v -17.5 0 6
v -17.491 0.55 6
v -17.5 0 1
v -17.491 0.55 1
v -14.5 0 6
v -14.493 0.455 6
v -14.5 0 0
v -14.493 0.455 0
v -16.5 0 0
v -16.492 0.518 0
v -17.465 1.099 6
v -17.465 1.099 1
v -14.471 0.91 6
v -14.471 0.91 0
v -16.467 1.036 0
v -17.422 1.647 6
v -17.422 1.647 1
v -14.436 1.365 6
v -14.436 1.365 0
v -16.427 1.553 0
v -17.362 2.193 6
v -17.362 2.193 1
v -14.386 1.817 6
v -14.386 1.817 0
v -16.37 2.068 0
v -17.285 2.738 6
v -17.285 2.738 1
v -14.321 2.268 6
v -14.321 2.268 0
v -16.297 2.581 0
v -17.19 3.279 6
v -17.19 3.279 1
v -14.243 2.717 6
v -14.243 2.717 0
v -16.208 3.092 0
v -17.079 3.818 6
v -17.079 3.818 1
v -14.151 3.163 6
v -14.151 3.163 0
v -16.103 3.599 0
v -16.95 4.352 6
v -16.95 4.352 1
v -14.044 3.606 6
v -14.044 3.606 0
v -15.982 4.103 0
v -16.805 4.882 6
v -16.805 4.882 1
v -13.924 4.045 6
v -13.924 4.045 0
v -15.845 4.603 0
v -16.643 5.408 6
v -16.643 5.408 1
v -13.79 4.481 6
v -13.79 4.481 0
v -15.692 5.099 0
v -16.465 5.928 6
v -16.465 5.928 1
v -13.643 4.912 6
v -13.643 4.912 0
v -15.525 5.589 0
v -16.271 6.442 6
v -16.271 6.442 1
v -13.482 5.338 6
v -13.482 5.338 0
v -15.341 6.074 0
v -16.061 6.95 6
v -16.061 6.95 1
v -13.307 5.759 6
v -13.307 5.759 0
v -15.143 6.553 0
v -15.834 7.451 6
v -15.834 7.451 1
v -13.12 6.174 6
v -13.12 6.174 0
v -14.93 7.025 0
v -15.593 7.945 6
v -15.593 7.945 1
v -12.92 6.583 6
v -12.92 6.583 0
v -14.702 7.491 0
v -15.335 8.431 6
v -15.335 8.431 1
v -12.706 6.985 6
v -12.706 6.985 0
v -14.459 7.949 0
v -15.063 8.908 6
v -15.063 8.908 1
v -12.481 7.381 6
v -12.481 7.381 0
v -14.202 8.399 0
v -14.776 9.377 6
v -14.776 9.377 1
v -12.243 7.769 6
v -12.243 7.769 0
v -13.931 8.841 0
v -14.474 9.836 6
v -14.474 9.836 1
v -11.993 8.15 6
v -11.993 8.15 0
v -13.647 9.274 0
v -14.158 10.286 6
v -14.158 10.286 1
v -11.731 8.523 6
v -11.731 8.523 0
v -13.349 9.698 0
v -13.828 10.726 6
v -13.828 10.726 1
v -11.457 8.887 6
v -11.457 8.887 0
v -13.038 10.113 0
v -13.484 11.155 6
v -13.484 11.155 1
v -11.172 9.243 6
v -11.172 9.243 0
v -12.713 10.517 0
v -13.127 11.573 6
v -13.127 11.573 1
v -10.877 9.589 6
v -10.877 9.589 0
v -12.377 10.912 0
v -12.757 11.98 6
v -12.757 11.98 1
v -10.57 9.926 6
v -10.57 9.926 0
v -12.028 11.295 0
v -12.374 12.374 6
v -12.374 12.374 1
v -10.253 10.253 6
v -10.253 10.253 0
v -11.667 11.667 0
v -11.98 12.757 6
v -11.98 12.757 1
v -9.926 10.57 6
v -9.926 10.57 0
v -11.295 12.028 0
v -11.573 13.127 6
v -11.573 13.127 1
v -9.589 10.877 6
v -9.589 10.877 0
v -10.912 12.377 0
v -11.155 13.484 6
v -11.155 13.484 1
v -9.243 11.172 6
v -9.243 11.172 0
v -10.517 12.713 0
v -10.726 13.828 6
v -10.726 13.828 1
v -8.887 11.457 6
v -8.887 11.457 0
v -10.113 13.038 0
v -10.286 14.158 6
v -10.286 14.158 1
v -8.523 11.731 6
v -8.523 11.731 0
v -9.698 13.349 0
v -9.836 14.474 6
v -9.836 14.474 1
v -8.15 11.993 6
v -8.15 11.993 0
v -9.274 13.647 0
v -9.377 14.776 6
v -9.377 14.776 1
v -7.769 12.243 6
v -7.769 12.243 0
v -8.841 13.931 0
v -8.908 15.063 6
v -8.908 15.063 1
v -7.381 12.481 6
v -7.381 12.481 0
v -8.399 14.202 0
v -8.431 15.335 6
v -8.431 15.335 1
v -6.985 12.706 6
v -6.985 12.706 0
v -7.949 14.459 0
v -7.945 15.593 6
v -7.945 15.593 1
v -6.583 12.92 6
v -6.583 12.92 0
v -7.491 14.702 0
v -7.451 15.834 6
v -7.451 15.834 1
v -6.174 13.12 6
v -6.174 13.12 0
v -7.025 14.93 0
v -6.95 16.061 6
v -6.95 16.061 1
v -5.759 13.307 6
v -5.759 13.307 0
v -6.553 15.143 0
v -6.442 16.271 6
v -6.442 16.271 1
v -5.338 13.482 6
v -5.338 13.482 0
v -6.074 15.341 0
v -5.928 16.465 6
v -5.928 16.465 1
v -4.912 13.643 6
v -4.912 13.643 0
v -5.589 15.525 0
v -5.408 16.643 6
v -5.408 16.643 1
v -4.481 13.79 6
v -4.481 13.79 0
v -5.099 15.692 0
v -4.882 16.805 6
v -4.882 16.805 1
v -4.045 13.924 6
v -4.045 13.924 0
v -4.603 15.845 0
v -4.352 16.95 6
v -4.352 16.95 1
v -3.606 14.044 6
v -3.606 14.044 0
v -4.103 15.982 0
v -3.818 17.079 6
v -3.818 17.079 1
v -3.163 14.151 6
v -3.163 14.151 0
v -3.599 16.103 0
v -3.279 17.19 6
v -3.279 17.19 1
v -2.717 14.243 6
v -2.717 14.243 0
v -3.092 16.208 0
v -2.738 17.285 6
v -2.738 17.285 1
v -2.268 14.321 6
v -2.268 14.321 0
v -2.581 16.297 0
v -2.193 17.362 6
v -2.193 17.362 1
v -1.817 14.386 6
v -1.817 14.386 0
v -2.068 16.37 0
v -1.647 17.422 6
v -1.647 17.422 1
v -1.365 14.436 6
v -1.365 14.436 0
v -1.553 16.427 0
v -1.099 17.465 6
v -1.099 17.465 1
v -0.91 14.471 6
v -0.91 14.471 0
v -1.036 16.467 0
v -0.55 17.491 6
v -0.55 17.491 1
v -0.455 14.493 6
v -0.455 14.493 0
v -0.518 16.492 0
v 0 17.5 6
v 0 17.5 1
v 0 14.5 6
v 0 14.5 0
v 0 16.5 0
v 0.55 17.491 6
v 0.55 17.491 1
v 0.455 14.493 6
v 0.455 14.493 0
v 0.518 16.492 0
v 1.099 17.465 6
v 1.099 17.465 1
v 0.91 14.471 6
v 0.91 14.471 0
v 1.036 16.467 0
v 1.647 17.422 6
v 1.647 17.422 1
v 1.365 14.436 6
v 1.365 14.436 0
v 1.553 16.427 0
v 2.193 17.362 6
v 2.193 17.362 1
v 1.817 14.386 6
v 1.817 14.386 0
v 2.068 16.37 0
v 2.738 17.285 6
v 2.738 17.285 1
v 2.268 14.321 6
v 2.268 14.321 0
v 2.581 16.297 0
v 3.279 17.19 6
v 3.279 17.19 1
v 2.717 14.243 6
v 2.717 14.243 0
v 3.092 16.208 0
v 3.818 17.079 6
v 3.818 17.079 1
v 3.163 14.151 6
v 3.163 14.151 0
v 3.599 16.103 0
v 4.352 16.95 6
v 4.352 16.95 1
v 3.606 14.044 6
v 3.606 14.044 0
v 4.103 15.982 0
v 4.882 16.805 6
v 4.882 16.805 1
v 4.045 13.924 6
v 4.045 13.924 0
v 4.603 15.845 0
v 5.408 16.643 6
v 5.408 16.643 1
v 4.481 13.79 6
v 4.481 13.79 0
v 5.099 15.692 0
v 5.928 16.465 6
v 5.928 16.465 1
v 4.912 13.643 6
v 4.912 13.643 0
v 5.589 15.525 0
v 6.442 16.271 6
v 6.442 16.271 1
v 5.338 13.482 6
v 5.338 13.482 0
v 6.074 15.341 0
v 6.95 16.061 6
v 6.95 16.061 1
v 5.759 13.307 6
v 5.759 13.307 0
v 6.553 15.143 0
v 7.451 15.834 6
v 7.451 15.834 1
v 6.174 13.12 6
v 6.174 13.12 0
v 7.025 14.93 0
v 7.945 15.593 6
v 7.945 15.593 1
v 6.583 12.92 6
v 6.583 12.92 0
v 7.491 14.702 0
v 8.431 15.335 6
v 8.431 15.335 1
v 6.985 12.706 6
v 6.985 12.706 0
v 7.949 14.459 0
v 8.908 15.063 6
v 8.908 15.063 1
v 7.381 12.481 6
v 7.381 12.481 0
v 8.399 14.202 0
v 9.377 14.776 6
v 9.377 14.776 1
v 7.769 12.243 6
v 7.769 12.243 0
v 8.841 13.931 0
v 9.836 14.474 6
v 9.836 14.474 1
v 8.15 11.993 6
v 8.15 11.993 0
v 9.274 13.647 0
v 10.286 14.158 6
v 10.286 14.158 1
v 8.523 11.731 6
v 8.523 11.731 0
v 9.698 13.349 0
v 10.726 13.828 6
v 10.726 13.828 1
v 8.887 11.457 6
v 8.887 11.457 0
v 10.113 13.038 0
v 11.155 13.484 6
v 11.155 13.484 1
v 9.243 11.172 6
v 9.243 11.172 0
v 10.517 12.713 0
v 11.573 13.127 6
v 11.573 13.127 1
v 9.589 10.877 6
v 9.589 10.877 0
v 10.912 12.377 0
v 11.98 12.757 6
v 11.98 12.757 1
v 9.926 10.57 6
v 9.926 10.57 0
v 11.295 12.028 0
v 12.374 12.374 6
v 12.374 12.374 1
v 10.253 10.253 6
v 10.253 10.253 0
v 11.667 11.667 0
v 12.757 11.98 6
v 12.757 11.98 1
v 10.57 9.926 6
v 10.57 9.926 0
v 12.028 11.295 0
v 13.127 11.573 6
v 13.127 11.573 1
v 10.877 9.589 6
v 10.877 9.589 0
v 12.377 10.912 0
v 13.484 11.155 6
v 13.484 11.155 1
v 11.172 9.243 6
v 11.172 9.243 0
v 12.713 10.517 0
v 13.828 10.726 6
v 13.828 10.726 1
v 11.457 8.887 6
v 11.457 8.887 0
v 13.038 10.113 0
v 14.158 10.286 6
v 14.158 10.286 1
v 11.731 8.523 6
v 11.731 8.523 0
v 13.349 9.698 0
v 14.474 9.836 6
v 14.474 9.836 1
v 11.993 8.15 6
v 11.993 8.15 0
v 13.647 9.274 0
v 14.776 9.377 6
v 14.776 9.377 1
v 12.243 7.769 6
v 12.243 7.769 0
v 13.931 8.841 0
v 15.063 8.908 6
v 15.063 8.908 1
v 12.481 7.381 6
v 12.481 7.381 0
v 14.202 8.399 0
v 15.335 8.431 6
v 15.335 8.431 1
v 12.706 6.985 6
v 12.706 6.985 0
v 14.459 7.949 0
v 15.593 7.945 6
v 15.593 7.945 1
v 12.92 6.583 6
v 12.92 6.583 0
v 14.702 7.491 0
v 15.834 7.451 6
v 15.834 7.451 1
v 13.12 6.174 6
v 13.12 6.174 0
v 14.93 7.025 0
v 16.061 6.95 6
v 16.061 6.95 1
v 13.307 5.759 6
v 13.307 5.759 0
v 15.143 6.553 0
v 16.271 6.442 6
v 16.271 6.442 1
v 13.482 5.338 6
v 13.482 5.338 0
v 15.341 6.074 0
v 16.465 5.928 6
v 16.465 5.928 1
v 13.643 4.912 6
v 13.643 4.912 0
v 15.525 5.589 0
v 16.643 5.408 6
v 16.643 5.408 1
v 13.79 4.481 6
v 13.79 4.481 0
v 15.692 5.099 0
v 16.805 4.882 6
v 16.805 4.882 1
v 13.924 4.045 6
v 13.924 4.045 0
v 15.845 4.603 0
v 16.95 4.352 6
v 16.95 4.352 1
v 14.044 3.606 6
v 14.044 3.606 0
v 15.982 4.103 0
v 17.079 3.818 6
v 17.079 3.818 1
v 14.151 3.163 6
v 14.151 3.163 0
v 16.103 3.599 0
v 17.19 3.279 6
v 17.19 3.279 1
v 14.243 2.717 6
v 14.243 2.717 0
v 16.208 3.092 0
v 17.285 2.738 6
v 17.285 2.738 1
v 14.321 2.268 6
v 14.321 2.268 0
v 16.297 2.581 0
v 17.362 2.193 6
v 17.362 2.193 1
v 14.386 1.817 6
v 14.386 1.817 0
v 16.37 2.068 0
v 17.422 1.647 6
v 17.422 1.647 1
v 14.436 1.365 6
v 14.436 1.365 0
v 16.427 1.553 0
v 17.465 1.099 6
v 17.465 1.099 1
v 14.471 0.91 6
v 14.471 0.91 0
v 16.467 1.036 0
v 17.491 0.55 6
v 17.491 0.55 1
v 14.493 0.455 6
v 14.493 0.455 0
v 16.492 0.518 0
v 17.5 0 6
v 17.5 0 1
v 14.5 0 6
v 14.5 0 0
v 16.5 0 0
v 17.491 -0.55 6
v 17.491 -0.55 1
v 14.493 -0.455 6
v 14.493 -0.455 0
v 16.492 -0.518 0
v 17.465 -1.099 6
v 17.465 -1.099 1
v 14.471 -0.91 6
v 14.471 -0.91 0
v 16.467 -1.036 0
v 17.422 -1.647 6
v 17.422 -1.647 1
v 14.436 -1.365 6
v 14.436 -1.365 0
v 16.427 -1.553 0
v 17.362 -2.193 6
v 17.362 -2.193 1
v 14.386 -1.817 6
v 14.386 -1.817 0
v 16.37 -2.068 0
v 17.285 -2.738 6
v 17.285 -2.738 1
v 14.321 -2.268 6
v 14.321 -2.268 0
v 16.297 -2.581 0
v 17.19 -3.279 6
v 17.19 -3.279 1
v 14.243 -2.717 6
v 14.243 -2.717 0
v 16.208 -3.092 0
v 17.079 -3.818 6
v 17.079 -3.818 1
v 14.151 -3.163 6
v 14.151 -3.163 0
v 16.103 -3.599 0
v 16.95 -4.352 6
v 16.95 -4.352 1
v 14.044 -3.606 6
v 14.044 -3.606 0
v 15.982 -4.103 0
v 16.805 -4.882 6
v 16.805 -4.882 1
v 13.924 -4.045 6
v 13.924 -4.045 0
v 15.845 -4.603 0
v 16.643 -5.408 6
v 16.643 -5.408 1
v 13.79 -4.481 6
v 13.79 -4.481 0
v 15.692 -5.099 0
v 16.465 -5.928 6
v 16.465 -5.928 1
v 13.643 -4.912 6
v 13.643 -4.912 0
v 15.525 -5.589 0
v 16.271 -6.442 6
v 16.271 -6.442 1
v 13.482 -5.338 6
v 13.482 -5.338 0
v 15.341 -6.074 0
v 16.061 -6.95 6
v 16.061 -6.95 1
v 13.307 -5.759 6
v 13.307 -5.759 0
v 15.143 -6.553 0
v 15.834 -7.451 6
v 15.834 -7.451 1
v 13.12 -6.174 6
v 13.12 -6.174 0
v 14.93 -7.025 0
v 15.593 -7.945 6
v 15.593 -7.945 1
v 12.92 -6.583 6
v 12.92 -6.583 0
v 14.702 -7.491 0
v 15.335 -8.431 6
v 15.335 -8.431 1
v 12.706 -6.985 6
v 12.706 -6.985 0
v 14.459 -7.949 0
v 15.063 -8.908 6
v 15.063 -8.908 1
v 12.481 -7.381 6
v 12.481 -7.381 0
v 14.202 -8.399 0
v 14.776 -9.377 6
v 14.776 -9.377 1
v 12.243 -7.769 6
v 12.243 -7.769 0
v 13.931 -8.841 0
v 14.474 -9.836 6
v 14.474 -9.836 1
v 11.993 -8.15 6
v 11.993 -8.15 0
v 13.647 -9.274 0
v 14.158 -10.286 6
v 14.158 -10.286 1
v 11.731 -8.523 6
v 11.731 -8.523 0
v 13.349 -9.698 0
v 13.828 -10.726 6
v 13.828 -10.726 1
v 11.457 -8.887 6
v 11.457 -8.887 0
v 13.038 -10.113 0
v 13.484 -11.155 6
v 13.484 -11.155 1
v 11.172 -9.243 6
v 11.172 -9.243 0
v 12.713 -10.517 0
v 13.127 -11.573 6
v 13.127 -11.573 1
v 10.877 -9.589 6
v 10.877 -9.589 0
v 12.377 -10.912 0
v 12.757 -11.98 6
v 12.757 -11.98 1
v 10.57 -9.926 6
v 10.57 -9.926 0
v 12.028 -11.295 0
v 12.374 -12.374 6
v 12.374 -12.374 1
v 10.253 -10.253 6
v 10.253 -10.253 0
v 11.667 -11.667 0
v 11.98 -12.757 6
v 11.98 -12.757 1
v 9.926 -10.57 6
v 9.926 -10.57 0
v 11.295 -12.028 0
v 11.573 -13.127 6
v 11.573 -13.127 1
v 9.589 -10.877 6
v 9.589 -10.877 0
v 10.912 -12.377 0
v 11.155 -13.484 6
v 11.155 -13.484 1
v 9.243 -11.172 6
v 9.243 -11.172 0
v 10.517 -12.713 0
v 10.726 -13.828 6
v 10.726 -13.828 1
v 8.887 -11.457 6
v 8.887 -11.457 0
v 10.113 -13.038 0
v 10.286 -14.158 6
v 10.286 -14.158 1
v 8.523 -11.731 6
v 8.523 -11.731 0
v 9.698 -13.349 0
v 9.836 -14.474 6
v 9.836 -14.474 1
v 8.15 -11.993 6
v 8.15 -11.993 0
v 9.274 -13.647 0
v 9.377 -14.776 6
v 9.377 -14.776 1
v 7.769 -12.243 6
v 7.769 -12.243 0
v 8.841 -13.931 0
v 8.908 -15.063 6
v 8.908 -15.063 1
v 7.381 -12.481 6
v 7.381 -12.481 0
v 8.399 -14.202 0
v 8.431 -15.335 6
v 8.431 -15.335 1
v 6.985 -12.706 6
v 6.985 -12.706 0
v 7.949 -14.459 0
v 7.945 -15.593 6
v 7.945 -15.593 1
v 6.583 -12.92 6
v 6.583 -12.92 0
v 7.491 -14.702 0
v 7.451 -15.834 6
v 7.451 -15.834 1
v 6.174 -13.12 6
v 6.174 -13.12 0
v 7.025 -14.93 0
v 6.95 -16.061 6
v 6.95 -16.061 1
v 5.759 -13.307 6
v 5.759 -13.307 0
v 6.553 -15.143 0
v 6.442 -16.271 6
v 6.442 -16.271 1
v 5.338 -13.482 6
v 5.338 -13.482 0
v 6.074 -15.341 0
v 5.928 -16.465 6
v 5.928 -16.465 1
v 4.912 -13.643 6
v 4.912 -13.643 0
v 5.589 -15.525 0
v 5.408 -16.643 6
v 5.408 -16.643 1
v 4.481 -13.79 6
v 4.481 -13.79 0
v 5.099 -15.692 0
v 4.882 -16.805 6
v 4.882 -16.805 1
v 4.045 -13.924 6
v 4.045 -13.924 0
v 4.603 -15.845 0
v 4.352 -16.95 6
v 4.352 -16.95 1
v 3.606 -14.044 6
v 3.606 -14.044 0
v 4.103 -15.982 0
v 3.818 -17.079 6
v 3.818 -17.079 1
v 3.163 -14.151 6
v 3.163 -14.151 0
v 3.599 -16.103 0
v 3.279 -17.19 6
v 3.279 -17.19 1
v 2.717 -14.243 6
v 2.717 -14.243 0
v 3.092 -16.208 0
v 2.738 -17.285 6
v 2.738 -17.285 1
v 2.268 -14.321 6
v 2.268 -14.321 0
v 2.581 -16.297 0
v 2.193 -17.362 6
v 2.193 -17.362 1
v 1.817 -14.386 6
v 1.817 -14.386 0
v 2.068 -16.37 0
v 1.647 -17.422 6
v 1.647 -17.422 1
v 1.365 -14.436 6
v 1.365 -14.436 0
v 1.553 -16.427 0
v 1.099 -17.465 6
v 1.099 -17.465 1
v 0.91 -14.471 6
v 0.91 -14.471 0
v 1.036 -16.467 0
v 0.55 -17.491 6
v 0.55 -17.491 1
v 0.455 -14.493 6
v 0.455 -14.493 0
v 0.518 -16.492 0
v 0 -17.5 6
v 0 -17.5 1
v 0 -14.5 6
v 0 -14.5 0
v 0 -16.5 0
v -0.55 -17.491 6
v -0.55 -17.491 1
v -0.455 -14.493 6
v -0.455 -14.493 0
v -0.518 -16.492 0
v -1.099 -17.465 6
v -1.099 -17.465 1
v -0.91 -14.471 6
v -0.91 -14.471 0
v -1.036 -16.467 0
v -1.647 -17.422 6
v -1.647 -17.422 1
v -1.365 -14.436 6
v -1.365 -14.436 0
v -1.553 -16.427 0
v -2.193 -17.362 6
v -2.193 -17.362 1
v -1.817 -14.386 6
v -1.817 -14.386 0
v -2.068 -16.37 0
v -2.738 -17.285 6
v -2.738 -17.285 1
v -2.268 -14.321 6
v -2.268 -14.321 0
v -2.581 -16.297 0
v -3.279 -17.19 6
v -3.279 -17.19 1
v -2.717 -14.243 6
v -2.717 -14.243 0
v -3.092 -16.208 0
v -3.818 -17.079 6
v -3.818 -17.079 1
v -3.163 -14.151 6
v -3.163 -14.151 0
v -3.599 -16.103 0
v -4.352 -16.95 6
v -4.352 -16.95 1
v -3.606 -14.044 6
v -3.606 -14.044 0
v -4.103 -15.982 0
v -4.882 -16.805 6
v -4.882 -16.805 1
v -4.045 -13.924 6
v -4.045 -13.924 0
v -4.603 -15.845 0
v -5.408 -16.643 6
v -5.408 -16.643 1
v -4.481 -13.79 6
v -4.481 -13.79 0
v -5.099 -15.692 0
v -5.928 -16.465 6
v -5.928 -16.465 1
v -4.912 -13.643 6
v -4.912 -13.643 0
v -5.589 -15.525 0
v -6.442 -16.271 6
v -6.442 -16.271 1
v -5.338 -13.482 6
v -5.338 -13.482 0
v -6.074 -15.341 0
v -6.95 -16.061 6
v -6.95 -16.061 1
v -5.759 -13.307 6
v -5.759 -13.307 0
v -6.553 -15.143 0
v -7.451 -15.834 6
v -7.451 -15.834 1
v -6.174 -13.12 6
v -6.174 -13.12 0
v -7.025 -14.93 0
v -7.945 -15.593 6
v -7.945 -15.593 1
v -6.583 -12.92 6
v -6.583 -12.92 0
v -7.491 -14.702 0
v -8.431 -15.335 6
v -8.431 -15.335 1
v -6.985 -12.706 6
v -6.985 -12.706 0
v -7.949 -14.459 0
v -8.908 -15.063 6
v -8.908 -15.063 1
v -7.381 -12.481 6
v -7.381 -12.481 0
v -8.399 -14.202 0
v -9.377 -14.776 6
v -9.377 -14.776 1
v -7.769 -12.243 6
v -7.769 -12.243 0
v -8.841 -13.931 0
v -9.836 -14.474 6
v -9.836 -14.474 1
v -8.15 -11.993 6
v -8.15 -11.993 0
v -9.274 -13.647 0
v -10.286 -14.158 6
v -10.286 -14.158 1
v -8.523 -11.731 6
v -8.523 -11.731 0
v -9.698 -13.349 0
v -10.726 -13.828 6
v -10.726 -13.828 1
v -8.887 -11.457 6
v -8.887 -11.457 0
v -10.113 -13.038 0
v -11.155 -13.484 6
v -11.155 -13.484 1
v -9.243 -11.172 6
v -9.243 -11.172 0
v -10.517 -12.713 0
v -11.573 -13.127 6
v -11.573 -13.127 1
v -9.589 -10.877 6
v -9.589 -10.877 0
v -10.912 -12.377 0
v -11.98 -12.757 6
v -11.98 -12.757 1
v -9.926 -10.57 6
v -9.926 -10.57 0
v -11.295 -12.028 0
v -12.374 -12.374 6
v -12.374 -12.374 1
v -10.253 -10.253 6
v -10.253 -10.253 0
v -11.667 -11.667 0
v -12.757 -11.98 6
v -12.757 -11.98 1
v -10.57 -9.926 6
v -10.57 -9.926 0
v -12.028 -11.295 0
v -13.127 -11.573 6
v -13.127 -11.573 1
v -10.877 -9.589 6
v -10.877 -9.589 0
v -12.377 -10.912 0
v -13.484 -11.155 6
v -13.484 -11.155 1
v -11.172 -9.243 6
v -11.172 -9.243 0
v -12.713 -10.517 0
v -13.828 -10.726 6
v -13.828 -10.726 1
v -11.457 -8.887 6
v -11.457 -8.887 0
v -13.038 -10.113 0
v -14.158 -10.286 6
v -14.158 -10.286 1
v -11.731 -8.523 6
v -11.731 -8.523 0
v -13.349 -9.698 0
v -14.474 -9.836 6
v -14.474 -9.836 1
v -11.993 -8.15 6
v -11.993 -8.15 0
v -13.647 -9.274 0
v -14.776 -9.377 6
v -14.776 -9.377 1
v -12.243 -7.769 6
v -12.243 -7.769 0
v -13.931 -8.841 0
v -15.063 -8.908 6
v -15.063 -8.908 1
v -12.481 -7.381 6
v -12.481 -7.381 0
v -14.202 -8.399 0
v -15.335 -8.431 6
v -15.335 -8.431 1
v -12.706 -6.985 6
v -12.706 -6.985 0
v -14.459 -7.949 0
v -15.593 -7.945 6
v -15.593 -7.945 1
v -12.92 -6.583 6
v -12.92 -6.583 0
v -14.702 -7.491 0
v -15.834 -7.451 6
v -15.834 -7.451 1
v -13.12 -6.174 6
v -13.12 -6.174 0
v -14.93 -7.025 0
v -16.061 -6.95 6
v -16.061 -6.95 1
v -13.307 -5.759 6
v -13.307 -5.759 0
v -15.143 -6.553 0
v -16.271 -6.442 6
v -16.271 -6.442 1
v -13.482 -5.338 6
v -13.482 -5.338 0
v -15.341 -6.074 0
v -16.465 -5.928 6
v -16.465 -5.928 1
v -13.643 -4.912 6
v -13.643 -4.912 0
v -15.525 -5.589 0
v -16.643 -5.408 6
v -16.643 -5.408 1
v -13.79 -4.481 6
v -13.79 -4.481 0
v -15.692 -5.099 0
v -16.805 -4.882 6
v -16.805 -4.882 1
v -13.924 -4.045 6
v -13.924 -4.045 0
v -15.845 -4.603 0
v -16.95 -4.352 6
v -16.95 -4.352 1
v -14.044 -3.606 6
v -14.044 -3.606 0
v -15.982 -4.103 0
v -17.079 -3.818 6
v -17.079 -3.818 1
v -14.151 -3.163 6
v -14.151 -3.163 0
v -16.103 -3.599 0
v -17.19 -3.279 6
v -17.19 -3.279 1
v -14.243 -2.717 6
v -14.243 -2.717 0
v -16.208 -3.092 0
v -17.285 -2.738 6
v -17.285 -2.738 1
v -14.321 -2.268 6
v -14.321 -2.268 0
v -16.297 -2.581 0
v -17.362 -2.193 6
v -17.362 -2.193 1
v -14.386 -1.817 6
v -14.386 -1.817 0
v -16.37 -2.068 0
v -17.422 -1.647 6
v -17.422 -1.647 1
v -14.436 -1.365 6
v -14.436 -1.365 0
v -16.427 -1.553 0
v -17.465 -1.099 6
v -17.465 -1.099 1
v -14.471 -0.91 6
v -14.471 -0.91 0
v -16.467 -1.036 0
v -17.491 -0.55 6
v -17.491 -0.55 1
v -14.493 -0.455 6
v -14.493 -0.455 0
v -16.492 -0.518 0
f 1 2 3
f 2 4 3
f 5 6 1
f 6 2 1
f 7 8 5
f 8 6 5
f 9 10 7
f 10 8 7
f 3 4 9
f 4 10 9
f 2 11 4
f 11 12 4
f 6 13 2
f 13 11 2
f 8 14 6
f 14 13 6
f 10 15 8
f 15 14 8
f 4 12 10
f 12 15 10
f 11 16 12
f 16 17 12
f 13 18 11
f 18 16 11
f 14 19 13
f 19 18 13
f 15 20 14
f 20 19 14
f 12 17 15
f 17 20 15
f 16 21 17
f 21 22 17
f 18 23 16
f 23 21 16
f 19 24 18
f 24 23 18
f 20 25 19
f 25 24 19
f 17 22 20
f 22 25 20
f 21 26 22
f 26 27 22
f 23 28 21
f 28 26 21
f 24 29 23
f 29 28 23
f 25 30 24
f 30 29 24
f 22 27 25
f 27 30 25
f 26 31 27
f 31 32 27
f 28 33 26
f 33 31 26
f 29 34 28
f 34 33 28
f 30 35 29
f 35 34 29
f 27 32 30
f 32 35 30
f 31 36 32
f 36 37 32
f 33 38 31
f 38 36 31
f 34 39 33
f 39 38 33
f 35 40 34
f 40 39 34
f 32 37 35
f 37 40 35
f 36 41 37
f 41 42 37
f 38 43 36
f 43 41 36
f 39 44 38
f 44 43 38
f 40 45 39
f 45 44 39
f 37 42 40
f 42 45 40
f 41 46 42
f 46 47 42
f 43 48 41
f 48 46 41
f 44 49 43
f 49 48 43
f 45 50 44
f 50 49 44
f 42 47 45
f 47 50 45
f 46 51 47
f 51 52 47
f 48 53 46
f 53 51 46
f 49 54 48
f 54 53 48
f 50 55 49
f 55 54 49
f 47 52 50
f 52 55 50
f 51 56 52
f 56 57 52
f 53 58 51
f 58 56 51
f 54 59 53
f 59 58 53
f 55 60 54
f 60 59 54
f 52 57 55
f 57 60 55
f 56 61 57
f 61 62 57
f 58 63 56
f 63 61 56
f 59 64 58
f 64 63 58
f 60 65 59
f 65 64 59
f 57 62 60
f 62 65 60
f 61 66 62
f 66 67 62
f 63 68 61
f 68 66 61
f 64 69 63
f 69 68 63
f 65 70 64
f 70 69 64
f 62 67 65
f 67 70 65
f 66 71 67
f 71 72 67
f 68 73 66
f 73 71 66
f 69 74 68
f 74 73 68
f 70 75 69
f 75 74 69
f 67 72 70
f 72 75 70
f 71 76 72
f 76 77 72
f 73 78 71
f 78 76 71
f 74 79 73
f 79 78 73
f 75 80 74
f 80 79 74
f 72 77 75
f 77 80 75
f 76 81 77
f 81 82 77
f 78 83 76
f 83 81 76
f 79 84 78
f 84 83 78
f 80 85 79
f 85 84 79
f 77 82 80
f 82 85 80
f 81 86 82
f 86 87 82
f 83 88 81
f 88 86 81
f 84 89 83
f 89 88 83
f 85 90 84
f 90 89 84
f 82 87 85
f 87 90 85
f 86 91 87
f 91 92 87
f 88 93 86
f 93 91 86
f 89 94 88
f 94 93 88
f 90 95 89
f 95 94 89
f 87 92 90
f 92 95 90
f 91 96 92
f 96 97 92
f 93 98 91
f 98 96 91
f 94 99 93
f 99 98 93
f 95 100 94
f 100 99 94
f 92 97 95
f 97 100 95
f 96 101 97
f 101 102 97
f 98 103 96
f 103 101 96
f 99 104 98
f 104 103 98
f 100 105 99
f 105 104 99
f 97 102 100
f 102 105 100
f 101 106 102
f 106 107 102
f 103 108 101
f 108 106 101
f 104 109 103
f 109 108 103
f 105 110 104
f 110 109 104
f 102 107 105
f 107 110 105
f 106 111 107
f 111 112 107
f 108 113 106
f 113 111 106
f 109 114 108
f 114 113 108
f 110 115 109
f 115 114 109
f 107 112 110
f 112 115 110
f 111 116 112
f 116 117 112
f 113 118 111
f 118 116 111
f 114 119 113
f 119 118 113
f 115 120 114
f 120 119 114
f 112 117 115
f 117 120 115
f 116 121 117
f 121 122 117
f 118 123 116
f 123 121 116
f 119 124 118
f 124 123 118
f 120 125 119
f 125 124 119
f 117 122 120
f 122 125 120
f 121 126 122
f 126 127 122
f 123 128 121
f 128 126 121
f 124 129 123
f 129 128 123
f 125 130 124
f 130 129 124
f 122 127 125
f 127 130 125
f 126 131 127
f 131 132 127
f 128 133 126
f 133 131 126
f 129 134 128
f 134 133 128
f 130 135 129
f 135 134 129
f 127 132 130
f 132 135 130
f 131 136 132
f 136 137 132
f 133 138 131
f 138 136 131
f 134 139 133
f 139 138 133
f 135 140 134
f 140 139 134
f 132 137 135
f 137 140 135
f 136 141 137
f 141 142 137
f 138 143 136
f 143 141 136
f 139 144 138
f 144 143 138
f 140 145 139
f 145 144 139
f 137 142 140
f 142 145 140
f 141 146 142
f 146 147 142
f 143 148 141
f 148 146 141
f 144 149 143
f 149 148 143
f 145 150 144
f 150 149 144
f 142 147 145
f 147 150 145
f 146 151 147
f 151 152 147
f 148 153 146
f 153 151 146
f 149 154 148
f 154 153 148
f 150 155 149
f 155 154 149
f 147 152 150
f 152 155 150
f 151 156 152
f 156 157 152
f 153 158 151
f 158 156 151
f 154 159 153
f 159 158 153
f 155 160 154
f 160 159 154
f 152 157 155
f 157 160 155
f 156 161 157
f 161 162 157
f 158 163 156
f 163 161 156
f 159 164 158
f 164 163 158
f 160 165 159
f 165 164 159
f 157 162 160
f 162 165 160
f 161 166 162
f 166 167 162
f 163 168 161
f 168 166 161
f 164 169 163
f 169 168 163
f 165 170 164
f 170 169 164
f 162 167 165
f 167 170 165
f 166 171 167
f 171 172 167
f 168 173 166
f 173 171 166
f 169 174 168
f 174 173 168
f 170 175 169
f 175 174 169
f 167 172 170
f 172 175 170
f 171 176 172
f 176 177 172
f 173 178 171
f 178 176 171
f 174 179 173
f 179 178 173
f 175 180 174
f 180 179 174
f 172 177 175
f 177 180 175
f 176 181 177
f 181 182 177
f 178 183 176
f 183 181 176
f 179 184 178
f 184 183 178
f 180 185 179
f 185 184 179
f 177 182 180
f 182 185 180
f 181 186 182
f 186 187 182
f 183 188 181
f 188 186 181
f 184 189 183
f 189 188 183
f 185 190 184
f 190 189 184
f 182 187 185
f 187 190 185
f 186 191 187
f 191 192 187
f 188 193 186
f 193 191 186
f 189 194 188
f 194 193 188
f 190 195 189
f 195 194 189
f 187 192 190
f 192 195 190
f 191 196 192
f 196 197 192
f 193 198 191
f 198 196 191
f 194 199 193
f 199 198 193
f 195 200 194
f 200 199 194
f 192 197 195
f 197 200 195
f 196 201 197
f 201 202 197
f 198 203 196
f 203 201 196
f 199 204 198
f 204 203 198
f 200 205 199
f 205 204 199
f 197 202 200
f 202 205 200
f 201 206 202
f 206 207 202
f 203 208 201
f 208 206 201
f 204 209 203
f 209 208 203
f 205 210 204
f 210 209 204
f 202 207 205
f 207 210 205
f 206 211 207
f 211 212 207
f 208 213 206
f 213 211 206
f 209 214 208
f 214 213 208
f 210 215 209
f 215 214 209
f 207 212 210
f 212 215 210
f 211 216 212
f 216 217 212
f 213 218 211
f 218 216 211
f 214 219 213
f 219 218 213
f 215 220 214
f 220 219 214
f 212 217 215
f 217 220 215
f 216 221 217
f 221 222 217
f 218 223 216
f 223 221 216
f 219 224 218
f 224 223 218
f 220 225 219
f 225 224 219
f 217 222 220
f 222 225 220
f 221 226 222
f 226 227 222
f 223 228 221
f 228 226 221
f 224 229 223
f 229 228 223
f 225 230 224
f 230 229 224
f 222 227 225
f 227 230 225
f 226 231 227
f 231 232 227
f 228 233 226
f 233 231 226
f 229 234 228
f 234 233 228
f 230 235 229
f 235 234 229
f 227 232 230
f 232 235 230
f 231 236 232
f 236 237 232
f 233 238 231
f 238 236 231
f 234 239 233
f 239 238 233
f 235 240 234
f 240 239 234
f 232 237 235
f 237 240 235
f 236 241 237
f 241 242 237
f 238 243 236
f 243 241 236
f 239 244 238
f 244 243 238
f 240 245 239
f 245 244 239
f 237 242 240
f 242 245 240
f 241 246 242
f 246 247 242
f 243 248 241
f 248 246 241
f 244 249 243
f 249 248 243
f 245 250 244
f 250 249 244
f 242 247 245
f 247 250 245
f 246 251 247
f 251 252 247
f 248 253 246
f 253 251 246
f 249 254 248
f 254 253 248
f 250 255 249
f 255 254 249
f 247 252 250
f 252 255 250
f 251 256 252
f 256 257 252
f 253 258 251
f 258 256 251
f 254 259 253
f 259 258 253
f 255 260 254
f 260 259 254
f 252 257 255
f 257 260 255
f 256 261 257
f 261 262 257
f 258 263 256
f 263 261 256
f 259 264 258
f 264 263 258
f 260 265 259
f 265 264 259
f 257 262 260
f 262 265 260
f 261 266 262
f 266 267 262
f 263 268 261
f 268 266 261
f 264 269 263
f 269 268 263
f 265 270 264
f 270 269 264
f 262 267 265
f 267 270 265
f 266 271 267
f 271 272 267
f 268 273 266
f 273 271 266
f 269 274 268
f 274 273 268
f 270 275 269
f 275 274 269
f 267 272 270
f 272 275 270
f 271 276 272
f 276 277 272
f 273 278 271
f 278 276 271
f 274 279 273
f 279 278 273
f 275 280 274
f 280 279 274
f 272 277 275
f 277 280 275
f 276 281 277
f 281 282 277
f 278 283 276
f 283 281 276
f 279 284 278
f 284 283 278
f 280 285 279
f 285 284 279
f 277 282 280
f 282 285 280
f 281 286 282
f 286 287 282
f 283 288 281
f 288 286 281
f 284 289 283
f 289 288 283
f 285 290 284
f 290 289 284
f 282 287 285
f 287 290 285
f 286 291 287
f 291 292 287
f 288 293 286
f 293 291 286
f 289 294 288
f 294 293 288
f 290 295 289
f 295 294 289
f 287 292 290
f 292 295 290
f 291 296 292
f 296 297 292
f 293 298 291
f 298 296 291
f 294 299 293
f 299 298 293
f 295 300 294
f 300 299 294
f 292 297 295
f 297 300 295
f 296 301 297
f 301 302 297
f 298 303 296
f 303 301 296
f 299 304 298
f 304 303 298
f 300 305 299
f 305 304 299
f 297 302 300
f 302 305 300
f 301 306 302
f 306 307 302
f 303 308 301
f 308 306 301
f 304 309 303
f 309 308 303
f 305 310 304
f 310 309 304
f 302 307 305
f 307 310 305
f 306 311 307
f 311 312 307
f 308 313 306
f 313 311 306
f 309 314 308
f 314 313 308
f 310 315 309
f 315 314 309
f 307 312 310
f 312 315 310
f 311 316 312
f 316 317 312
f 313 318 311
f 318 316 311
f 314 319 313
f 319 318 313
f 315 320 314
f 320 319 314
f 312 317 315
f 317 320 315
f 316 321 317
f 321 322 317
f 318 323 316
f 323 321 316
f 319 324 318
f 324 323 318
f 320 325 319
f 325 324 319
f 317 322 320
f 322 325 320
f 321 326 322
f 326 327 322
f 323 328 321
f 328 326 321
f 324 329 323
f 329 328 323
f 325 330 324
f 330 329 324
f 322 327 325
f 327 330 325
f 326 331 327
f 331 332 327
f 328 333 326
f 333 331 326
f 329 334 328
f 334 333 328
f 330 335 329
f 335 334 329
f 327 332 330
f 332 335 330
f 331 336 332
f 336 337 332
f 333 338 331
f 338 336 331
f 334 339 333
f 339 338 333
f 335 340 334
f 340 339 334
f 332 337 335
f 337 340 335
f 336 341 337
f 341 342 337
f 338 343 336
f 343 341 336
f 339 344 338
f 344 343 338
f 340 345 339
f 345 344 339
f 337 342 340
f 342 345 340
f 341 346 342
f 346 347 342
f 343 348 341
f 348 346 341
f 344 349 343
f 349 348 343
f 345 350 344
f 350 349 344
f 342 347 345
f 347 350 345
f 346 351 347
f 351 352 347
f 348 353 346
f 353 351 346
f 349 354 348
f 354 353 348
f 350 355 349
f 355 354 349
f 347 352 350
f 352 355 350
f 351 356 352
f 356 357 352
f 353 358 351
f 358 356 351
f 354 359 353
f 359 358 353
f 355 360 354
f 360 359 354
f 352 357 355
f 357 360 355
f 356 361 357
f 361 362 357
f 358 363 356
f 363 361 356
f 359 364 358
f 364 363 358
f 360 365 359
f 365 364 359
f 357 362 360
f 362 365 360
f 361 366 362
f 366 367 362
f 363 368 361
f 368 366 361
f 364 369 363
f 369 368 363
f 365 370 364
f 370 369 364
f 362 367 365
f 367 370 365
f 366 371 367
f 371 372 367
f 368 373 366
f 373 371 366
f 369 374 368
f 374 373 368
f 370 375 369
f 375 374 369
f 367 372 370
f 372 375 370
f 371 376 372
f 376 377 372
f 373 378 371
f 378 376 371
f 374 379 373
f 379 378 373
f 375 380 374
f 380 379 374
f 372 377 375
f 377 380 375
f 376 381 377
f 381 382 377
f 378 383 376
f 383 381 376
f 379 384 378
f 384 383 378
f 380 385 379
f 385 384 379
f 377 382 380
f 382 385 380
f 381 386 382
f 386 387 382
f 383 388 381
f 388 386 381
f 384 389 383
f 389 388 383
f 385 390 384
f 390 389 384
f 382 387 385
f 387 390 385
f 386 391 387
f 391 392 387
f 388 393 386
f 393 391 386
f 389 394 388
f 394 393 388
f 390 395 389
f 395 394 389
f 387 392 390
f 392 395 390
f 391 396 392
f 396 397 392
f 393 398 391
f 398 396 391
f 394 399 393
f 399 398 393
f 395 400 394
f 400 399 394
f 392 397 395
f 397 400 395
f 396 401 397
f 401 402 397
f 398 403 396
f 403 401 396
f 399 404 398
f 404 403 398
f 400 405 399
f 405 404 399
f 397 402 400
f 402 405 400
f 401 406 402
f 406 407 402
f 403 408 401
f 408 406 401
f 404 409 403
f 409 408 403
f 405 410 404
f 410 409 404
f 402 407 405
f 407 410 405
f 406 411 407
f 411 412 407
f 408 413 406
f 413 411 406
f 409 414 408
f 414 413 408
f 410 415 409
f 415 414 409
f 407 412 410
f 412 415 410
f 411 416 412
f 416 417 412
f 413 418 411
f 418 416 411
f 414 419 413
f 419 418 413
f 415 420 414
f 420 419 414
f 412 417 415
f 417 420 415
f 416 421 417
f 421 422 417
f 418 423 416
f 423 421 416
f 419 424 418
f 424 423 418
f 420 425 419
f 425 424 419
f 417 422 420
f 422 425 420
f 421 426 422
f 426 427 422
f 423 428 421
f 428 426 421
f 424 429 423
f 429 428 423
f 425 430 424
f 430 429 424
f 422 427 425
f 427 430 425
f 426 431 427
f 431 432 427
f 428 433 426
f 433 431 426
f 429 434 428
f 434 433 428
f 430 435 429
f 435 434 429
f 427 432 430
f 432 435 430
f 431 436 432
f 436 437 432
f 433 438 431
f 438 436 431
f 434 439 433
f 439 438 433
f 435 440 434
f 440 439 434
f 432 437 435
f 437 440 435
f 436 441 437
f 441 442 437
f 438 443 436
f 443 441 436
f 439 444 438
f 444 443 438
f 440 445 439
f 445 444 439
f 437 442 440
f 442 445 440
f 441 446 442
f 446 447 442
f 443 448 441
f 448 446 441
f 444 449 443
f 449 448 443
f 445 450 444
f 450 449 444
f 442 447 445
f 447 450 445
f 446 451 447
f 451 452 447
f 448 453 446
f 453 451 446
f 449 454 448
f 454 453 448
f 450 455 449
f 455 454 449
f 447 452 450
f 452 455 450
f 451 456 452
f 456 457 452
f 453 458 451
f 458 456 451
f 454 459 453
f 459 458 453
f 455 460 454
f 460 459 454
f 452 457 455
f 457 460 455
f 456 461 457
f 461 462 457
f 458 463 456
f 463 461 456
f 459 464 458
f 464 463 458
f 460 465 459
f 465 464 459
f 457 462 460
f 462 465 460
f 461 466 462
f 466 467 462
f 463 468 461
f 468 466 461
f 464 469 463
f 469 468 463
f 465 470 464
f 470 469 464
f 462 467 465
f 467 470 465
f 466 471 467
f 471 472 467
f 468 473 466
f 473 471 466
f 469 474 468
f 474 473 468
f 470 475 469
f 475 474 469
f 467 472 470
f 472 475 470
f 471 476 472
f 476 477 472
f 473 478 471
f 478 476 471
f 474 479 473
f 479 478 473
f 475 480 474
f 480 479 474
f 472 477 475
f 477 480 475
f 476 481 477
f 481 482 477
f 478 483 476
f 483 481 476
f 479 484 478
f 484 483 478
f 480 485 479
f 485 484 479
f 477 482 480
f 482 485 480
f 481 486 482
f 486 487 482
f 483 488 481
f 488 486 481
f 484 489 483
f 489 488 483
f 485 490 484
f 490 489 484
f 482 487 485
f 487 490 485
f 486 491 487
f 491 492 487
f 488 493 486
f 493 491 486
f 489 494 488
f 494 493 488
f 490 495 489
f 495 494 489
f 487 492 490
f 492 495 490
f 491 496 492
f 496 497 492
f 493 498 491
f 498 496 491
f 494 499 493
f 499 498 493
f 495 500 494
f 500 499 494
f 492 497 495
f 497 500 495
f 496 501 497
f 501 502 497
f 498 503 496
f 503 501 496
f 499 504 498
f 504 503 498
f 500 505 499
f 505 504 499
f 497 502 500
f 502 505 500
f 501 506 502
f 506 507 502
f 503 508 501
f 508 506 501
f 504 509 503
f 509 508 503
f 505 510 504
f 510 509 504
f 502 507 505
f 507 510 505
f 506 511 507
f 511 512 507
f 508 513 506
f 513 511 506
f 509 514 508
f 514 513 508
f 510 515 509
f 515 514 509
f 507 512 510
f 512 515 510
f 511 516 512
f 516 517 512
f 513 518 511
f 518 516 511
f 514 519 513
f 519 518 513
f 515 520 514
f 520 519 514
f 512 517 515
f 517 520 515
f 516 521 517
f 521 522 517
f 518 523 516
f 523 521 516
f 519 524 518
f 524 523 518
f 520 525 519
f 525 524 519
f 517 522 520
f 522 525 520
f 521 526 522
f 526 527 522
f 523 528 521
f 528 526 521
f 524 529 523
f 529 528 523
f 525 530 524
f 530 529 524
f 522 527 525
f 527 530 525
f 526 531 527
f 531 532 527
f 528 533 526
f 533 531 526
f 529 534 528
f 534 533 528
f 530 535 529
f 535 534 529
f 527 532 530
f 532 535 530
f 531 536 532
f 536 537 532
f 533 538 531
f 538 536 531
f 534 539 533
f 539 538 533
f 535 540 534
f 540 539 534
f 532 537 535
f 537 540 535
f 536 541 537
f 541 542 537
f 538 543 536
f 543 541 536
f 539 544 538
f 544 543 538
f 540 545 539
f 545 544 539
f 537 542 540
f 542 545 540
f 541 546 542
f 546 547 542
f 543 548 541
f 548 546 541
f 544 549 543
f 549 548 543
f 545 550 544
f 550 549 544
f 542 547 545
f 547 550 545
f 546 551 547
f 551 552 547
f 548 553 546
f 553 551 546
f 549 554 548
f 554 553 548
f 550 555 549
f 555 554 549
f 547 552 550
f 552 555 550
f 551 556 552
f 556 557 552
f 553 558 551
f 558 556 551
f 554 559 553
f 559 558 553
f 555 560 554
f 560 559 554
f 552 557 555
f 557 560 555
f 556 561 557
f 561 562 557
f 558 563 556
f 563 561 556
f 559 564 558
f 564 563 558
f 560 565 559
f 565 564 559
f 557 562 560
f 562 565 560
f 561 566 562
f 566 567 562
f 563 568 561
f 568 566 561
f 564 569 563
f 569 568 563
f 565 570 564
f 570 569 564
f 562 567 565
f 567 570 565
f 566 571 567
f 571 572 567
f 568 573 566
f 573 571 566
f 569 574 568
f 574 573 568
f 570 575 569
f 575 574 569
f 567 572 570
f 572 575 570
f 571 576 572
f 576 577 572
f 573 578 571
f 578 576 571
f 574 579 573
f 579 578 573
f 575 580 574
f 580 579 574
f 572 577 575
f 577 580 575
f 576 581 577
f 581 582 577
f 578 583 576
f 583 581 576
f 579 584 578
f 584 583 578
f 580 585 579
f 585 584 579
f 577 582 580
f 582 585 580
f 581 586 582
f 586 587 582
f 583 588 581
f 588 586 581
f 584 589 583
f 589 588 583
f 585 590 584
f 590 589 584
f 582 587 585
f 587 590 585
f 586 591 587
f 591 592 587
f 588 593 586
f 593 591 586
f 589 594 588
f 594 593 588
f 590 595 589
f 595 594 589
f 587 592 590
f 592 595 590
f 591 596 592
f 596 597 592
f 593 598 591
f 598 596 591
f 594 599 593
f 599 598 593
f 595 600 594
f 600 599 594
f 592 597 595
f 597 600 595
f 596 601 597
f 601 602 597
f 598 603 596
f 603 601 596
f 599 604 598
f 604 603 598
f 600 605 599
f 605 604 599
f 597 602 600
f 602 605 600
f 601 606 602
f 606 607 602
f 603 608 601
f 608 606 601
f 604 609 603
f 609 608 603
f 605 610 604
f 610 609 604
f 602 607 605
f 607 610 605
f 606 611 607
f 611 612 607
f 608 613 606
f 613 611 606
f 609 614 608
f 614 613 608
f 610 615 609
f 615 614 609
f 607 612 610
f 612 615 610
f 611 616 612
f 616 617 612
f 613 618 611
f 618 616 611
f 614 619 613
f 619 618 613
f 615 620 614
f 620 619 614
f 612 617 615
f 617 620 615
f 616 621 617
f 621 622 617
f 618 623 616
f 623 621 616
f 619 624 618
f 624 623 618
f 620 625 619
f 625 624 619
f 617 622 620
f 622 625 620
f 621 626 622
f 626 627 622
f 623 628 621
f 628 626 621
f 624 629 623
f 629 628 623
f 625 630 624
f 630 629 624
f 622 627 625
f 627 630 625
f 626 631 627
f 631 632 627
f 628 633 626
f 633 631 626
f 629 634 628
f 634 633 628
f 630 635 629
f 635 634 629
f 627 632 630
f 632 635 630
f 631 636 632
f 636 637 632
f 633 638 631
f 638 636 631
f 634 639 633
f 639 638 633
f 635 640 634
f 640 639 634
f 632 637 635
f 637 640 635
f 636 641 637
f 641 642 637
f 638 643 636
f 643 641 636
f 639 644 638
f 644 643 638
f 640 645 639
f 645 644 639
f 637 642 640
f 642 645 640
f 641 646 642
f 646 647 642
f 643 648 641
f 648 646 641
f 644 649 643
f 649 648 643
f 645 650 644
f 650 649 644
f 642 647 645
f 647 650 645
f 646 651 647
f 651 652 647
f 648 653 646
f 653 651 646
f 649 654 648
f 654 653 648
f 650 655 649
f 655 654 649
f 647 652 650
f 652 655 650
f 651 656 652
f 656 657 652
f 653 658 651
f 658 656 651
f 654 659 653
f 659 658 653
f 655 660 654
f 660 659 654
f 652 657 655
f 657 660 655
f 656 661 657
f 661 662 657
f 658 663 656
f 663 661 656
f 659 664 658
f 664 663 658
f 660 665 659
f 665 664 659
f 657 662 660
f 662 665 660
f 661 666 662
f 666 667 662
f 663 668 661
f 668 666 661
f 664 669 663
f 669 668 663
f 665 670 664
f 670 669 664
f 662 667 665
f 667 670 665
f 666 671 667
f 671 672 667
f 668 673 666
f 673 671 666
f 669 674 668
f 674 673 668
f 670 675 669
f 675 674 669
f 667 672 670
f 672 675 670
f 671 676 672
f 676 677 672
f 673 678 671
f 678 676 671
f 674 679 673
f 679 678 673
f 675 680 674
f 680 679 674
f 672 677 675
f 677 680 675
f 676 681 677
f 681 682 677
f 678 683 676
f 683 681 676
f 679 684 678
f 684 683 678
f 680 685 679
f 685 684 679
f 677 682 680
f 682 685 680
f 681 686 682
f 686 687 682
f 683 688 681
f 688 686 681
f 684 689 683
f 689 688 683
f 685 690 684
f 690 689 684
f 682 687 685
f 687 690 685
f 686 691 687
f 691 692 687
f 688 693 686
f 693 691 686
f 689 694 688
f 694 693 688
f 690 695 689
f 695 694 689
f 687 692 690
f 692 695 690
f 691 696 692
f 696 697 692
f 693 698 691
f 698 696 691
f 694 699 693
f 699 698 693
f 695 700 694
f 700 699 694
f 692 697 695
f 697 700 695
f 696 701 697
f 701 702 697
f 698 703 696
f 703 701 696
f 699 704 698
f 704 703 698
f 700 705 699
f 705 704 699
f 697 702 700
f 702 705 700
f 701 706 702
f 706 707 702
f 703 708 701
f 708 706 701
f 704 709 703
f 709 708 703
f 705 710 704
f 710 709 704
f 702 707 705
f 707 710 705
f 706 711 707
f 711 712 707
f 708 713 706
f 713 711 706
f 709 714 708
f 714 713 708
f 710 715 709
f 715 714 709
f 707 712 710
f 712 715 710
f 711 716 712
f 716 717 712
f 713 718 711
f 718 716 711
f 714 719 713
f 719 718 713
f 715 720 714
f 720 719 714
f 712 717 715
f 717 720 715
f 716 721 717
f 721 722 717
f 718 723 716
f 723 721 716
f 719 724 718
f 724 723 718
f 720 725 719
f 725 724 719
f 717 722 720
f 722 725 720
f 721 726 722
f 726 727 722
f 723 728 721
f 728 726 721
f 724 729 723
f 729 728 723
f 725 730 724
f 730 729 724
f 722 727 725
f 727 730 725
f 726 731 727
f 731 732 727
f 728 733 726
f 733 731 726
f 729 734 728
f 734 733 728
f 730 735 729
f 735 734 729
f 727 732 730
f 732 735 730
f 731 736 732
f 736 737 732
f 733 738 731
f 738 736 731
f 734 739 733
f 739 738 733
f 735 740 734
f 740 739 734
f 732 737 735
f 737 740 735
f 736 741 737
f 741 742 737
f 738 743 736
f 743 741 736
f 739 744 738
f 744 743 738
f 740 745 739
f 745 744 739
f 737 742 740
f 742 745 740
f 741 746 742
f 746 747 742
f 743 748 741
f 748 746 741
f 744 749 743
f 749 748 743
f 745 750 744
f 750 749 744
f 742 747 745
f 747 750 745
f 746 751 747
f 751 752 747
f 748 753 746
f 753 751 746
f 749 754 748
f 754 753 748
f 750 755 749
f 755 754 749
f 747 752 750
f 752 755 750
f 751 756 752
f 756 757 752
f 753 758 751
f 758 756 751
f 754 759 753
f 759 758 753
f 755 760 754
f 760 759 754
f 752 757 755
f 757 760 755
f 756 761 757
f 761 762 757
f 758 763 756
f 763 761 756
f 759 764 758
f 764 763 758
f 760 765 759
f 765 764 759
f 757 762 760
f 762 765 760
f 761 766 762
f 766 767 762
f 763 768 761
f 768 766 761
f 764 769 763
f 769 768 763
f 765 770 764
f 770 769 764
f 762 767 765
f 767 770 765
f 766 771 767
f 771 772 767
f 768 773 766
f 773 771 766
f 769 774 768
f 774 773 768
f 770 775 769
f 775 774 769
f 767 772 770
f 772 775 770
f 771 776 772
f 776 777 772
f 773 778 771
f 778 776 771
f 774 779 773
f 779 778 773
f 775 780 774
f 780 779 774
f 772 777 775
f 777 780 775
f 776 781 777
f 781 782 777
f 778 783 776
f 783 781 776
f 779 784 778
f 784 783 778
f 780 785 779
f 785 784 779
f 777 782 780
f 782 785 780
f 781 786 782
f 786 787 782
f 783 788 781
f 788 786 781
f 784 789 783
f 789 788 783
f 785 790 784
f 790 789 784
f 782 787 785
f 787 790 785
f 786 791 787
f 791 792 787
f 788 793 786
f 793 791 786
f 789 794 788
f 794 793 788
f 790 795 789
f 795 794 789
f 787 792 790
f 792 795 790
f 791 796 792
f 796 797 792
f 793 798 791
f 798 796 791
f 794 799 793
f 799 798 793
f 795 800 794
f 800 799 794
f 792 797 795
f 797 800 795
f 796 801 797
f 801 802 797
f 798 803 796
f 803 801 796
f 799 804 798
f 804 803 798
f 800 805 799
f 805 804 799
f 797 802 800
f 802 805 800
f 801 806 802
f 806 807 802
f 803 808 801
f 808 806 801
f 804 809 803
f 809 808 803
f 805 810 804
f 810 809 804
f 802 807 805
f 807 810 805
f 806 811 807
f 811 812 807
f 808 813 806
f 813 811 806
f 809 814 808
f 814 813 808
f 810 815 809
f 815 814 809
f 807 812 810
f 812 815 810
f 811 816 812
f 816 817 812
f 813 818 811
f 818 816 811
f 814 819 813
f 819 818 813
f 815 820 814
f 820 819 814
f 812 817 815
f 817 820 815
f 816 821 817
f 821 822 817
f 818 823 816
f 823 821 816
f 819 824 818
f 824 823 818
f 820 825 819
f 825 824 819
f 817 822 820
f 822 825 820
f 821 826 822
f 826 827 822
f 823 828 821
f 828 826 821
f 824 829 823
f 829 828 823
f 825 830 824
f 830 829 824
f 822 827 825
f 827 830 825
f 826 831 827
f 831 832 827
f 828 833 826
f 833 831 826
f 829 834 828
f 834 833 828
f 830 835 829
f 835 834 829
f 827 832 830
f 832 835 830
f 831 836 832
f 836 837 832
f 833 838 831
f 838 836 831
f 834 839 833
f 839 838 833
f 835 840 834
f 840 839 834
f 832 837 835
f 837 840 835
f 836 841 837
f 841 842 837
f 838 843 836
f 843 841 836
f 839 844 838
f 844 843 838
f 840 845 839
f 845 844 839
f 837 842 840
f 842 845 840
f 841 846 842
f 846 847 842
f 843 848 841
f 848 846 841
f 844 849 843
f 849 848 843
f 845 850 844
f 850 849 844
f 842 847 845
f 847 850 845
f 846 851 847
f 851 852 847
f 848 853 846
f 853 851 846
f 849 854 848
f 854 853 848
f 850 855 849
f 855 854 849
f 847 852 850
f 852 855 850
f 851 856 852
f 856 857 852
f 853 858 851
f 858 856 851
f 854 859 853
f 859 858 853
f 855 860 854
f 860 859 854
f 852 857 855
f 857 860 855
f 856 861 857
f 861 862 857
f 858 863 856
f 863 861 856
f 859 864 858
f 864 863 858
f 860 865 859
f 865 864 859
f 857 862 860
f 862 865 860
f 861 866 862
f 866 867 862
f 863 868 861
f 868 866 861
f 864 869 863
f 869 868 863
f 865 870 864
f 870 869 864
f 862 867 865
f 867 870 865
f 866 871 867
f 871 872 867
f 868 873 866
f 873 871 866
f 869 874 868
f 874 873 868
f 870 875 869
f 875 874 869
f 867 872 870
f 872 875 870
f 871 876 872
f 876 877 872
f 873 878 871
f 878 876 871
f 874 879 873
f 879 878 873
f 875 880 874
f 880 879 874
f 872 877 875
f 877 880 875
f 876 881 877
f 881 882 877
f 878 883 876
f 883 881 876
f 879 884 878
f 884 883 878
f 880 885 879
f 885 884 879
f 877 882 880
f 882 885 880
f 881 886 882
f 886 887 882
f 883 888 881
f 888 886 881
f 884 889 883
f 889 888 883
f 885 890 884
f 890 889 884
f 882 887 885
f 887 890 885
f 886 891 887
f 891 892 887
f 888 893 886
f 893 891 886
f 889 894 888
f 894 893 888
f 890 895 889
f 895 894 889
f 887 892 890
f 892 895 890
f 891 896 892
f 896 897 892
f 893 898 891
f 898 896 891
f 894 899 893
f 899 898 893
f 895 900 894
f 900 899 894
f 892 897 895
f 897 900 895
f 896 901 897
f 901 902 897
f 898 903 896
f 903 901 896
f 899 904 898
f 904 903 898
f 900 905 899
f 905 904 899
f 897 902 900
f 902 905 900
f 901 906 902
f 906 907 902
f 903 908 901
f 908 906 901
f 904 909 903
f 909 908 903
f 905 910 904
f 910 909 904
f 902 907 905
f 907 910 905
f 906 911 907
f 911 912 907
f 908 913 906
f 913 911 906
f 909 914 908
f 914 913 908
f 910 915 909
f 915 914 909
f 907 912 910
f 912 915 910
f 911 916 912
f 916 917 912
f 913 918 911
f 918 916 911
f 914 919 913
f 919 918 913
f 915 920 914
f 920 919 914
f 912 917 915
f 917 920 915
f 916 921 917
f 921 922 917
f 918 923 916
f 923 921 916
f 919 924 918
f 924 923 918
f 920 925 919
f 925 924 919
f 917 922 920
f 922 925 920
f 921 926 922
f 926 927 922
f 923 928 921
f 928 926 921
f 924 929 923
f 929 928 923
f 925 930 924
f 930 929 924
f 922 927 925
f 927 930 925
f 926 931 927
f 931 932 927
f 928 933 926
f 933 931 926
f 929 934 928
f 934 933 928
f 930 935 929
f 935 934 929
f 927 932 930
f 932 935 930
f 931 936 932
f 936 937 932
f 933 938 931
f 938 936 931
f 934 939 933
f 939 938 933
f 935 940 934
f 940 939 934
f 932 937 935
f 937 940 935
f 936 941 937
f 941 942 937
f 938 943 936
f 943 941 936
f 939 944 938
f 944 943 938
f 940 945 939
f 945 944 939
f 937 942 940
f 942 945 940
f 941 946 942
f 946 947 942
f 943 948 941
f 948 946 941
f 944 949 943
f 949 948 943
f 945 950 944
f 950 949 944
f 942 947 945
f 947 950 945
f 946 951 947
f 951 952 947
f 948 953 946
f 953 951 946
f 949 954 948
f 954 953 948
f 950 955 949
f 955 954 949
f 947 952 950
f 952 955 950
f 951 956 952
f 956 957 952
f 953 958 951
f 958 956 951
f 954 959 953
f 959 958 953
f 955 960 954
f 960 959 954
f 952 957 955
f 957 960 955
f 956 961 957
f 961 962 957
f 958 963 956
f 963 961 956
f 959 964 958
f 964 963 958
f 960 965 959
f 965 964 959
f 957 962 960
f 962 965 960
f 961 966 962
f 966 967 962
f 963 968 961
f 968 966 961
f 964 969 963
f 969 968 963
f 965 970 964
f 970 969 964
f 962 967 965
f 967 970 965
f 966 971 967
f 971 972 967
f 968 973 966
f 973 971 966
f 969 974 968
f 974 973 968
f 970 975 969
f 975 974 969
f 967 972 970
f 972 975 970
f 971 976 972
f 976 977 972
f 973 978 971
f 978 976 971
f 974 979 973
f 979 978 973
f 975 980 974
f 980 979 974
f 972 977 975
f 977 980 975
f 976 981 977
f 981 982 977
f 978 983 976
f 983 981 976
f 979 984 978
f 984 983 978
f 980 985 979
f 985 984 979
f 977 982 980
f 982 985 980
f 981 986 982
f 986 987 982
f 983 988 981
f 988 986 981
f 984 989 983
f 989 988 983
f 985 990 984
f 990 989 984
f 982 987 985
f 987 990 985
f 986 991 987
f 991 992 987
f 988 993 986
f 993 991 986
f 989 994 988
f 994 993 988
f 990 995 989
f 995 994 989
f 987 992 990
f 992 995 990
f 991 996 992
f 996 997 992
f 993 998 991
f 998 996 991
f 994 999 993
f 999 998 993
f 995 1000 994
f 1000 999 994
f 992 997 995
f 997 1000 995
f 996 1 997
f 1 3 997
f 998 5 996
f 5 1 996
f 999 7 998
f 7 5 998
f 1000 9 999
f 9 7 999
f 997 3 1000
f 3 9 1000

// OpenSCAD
// file: RocketCouplers.scad
bt20id = 18.0;  // Motors ABC
bt50id = 24.1;  // Motors DE
bt52hid = 29.0; // Motors EFG
bt55id = 32.6;
bt60id = 40.6;
bt70id = 55.2;
bt80id = 65.0;

bt20od = 18.7;
bt50od = 24.8;
bt52hod = 31.0;
bt55od = 33.7;
bt60od = 41.7;
bt70od = 56.3;
bt80od = 66.0;

module hollowCylinderAsBase(r,wall,h)
{
    pts = [
        [r-wall,h],
        [r,h],
        [r,1],
        [r-1,0],
        [r-wall,0]];
    rotate_extrude()
    polygon(pts,convexity=2);
}

module hollowCylinderWithDrop(r,wall,h)
{
    pts = [
        [r-wall,h],
        [r,h],
        [r,0],
        [r-wall/2,-wall/2],
        [r-wall,0]];
    rotate_extrude()
    polygon(pts,convexity=2);
}

module hollowConeWithDrop(r1,r2,wall,h)
{
    pts = [
    [r2-wall,h],
    [r2,h],
    [r1,0],
    [r1-wall/2,-wall/2],
    [r1-wall,0]];
    rotate_extrude()
    polygon(pts,convexity=2);
}

module hollowConeWithDropAndHole(r1,r2,wall,h)
{
    pts = [
    [r2-wall,h],
    [r2,h],
    [r1,0],
    [r1-wall/2,-wall/2],
    [r1-wall,0]];
    difference()
    {
        rotate_extrude()
        polygon(pts,convexity=2);
        translate([(r1+r2-wall)/2.0,0])
        cylinder(r=wall/1.5,h);
    }
}

// This is a spherical cap that has a slope of -1 at its edge.

module capWithDrop(r)
{
    rho = 1.414*r;
    translate([0,0,-r])
    intersection()
    {
        sphere(rho,$fn=50);
        cylinder(r1=0,r2=2*rho,h=2*rho);
        translate([-2*rho,-2*rho,r-1])
        cube(4*rho);
    }    
}

//capWithDrop(10);

/*
wall = 3;
h1 = 10;
h2 = 25;
h3 = 10;
hollowCylinderAsBase(bt55id/2,wall,h1);
translate([0,0,h1])
hollowConeWithDropAndHole(bt55od/2,bt70od/2,wall,h2);
translate([0,0,h1+h2])
hollowCylinderWithDrop(bt70id/2,wall,h3);
*/
// main file
$fn = 200;
inch = 25.4;

include <RocketCouplers.scad>
bt52adj = 0.0; // 0.2 on TAZ. Trying 0.0 on Prusa. -0.05 is too tight.

rIn = bt52hid/2 + bt52adj;
echo(2*rIn/inch);
rOut = rIn + 3.0;
h = 6.0;

hollowCylinderAsBase(rOut,rOut-rIn,h);
